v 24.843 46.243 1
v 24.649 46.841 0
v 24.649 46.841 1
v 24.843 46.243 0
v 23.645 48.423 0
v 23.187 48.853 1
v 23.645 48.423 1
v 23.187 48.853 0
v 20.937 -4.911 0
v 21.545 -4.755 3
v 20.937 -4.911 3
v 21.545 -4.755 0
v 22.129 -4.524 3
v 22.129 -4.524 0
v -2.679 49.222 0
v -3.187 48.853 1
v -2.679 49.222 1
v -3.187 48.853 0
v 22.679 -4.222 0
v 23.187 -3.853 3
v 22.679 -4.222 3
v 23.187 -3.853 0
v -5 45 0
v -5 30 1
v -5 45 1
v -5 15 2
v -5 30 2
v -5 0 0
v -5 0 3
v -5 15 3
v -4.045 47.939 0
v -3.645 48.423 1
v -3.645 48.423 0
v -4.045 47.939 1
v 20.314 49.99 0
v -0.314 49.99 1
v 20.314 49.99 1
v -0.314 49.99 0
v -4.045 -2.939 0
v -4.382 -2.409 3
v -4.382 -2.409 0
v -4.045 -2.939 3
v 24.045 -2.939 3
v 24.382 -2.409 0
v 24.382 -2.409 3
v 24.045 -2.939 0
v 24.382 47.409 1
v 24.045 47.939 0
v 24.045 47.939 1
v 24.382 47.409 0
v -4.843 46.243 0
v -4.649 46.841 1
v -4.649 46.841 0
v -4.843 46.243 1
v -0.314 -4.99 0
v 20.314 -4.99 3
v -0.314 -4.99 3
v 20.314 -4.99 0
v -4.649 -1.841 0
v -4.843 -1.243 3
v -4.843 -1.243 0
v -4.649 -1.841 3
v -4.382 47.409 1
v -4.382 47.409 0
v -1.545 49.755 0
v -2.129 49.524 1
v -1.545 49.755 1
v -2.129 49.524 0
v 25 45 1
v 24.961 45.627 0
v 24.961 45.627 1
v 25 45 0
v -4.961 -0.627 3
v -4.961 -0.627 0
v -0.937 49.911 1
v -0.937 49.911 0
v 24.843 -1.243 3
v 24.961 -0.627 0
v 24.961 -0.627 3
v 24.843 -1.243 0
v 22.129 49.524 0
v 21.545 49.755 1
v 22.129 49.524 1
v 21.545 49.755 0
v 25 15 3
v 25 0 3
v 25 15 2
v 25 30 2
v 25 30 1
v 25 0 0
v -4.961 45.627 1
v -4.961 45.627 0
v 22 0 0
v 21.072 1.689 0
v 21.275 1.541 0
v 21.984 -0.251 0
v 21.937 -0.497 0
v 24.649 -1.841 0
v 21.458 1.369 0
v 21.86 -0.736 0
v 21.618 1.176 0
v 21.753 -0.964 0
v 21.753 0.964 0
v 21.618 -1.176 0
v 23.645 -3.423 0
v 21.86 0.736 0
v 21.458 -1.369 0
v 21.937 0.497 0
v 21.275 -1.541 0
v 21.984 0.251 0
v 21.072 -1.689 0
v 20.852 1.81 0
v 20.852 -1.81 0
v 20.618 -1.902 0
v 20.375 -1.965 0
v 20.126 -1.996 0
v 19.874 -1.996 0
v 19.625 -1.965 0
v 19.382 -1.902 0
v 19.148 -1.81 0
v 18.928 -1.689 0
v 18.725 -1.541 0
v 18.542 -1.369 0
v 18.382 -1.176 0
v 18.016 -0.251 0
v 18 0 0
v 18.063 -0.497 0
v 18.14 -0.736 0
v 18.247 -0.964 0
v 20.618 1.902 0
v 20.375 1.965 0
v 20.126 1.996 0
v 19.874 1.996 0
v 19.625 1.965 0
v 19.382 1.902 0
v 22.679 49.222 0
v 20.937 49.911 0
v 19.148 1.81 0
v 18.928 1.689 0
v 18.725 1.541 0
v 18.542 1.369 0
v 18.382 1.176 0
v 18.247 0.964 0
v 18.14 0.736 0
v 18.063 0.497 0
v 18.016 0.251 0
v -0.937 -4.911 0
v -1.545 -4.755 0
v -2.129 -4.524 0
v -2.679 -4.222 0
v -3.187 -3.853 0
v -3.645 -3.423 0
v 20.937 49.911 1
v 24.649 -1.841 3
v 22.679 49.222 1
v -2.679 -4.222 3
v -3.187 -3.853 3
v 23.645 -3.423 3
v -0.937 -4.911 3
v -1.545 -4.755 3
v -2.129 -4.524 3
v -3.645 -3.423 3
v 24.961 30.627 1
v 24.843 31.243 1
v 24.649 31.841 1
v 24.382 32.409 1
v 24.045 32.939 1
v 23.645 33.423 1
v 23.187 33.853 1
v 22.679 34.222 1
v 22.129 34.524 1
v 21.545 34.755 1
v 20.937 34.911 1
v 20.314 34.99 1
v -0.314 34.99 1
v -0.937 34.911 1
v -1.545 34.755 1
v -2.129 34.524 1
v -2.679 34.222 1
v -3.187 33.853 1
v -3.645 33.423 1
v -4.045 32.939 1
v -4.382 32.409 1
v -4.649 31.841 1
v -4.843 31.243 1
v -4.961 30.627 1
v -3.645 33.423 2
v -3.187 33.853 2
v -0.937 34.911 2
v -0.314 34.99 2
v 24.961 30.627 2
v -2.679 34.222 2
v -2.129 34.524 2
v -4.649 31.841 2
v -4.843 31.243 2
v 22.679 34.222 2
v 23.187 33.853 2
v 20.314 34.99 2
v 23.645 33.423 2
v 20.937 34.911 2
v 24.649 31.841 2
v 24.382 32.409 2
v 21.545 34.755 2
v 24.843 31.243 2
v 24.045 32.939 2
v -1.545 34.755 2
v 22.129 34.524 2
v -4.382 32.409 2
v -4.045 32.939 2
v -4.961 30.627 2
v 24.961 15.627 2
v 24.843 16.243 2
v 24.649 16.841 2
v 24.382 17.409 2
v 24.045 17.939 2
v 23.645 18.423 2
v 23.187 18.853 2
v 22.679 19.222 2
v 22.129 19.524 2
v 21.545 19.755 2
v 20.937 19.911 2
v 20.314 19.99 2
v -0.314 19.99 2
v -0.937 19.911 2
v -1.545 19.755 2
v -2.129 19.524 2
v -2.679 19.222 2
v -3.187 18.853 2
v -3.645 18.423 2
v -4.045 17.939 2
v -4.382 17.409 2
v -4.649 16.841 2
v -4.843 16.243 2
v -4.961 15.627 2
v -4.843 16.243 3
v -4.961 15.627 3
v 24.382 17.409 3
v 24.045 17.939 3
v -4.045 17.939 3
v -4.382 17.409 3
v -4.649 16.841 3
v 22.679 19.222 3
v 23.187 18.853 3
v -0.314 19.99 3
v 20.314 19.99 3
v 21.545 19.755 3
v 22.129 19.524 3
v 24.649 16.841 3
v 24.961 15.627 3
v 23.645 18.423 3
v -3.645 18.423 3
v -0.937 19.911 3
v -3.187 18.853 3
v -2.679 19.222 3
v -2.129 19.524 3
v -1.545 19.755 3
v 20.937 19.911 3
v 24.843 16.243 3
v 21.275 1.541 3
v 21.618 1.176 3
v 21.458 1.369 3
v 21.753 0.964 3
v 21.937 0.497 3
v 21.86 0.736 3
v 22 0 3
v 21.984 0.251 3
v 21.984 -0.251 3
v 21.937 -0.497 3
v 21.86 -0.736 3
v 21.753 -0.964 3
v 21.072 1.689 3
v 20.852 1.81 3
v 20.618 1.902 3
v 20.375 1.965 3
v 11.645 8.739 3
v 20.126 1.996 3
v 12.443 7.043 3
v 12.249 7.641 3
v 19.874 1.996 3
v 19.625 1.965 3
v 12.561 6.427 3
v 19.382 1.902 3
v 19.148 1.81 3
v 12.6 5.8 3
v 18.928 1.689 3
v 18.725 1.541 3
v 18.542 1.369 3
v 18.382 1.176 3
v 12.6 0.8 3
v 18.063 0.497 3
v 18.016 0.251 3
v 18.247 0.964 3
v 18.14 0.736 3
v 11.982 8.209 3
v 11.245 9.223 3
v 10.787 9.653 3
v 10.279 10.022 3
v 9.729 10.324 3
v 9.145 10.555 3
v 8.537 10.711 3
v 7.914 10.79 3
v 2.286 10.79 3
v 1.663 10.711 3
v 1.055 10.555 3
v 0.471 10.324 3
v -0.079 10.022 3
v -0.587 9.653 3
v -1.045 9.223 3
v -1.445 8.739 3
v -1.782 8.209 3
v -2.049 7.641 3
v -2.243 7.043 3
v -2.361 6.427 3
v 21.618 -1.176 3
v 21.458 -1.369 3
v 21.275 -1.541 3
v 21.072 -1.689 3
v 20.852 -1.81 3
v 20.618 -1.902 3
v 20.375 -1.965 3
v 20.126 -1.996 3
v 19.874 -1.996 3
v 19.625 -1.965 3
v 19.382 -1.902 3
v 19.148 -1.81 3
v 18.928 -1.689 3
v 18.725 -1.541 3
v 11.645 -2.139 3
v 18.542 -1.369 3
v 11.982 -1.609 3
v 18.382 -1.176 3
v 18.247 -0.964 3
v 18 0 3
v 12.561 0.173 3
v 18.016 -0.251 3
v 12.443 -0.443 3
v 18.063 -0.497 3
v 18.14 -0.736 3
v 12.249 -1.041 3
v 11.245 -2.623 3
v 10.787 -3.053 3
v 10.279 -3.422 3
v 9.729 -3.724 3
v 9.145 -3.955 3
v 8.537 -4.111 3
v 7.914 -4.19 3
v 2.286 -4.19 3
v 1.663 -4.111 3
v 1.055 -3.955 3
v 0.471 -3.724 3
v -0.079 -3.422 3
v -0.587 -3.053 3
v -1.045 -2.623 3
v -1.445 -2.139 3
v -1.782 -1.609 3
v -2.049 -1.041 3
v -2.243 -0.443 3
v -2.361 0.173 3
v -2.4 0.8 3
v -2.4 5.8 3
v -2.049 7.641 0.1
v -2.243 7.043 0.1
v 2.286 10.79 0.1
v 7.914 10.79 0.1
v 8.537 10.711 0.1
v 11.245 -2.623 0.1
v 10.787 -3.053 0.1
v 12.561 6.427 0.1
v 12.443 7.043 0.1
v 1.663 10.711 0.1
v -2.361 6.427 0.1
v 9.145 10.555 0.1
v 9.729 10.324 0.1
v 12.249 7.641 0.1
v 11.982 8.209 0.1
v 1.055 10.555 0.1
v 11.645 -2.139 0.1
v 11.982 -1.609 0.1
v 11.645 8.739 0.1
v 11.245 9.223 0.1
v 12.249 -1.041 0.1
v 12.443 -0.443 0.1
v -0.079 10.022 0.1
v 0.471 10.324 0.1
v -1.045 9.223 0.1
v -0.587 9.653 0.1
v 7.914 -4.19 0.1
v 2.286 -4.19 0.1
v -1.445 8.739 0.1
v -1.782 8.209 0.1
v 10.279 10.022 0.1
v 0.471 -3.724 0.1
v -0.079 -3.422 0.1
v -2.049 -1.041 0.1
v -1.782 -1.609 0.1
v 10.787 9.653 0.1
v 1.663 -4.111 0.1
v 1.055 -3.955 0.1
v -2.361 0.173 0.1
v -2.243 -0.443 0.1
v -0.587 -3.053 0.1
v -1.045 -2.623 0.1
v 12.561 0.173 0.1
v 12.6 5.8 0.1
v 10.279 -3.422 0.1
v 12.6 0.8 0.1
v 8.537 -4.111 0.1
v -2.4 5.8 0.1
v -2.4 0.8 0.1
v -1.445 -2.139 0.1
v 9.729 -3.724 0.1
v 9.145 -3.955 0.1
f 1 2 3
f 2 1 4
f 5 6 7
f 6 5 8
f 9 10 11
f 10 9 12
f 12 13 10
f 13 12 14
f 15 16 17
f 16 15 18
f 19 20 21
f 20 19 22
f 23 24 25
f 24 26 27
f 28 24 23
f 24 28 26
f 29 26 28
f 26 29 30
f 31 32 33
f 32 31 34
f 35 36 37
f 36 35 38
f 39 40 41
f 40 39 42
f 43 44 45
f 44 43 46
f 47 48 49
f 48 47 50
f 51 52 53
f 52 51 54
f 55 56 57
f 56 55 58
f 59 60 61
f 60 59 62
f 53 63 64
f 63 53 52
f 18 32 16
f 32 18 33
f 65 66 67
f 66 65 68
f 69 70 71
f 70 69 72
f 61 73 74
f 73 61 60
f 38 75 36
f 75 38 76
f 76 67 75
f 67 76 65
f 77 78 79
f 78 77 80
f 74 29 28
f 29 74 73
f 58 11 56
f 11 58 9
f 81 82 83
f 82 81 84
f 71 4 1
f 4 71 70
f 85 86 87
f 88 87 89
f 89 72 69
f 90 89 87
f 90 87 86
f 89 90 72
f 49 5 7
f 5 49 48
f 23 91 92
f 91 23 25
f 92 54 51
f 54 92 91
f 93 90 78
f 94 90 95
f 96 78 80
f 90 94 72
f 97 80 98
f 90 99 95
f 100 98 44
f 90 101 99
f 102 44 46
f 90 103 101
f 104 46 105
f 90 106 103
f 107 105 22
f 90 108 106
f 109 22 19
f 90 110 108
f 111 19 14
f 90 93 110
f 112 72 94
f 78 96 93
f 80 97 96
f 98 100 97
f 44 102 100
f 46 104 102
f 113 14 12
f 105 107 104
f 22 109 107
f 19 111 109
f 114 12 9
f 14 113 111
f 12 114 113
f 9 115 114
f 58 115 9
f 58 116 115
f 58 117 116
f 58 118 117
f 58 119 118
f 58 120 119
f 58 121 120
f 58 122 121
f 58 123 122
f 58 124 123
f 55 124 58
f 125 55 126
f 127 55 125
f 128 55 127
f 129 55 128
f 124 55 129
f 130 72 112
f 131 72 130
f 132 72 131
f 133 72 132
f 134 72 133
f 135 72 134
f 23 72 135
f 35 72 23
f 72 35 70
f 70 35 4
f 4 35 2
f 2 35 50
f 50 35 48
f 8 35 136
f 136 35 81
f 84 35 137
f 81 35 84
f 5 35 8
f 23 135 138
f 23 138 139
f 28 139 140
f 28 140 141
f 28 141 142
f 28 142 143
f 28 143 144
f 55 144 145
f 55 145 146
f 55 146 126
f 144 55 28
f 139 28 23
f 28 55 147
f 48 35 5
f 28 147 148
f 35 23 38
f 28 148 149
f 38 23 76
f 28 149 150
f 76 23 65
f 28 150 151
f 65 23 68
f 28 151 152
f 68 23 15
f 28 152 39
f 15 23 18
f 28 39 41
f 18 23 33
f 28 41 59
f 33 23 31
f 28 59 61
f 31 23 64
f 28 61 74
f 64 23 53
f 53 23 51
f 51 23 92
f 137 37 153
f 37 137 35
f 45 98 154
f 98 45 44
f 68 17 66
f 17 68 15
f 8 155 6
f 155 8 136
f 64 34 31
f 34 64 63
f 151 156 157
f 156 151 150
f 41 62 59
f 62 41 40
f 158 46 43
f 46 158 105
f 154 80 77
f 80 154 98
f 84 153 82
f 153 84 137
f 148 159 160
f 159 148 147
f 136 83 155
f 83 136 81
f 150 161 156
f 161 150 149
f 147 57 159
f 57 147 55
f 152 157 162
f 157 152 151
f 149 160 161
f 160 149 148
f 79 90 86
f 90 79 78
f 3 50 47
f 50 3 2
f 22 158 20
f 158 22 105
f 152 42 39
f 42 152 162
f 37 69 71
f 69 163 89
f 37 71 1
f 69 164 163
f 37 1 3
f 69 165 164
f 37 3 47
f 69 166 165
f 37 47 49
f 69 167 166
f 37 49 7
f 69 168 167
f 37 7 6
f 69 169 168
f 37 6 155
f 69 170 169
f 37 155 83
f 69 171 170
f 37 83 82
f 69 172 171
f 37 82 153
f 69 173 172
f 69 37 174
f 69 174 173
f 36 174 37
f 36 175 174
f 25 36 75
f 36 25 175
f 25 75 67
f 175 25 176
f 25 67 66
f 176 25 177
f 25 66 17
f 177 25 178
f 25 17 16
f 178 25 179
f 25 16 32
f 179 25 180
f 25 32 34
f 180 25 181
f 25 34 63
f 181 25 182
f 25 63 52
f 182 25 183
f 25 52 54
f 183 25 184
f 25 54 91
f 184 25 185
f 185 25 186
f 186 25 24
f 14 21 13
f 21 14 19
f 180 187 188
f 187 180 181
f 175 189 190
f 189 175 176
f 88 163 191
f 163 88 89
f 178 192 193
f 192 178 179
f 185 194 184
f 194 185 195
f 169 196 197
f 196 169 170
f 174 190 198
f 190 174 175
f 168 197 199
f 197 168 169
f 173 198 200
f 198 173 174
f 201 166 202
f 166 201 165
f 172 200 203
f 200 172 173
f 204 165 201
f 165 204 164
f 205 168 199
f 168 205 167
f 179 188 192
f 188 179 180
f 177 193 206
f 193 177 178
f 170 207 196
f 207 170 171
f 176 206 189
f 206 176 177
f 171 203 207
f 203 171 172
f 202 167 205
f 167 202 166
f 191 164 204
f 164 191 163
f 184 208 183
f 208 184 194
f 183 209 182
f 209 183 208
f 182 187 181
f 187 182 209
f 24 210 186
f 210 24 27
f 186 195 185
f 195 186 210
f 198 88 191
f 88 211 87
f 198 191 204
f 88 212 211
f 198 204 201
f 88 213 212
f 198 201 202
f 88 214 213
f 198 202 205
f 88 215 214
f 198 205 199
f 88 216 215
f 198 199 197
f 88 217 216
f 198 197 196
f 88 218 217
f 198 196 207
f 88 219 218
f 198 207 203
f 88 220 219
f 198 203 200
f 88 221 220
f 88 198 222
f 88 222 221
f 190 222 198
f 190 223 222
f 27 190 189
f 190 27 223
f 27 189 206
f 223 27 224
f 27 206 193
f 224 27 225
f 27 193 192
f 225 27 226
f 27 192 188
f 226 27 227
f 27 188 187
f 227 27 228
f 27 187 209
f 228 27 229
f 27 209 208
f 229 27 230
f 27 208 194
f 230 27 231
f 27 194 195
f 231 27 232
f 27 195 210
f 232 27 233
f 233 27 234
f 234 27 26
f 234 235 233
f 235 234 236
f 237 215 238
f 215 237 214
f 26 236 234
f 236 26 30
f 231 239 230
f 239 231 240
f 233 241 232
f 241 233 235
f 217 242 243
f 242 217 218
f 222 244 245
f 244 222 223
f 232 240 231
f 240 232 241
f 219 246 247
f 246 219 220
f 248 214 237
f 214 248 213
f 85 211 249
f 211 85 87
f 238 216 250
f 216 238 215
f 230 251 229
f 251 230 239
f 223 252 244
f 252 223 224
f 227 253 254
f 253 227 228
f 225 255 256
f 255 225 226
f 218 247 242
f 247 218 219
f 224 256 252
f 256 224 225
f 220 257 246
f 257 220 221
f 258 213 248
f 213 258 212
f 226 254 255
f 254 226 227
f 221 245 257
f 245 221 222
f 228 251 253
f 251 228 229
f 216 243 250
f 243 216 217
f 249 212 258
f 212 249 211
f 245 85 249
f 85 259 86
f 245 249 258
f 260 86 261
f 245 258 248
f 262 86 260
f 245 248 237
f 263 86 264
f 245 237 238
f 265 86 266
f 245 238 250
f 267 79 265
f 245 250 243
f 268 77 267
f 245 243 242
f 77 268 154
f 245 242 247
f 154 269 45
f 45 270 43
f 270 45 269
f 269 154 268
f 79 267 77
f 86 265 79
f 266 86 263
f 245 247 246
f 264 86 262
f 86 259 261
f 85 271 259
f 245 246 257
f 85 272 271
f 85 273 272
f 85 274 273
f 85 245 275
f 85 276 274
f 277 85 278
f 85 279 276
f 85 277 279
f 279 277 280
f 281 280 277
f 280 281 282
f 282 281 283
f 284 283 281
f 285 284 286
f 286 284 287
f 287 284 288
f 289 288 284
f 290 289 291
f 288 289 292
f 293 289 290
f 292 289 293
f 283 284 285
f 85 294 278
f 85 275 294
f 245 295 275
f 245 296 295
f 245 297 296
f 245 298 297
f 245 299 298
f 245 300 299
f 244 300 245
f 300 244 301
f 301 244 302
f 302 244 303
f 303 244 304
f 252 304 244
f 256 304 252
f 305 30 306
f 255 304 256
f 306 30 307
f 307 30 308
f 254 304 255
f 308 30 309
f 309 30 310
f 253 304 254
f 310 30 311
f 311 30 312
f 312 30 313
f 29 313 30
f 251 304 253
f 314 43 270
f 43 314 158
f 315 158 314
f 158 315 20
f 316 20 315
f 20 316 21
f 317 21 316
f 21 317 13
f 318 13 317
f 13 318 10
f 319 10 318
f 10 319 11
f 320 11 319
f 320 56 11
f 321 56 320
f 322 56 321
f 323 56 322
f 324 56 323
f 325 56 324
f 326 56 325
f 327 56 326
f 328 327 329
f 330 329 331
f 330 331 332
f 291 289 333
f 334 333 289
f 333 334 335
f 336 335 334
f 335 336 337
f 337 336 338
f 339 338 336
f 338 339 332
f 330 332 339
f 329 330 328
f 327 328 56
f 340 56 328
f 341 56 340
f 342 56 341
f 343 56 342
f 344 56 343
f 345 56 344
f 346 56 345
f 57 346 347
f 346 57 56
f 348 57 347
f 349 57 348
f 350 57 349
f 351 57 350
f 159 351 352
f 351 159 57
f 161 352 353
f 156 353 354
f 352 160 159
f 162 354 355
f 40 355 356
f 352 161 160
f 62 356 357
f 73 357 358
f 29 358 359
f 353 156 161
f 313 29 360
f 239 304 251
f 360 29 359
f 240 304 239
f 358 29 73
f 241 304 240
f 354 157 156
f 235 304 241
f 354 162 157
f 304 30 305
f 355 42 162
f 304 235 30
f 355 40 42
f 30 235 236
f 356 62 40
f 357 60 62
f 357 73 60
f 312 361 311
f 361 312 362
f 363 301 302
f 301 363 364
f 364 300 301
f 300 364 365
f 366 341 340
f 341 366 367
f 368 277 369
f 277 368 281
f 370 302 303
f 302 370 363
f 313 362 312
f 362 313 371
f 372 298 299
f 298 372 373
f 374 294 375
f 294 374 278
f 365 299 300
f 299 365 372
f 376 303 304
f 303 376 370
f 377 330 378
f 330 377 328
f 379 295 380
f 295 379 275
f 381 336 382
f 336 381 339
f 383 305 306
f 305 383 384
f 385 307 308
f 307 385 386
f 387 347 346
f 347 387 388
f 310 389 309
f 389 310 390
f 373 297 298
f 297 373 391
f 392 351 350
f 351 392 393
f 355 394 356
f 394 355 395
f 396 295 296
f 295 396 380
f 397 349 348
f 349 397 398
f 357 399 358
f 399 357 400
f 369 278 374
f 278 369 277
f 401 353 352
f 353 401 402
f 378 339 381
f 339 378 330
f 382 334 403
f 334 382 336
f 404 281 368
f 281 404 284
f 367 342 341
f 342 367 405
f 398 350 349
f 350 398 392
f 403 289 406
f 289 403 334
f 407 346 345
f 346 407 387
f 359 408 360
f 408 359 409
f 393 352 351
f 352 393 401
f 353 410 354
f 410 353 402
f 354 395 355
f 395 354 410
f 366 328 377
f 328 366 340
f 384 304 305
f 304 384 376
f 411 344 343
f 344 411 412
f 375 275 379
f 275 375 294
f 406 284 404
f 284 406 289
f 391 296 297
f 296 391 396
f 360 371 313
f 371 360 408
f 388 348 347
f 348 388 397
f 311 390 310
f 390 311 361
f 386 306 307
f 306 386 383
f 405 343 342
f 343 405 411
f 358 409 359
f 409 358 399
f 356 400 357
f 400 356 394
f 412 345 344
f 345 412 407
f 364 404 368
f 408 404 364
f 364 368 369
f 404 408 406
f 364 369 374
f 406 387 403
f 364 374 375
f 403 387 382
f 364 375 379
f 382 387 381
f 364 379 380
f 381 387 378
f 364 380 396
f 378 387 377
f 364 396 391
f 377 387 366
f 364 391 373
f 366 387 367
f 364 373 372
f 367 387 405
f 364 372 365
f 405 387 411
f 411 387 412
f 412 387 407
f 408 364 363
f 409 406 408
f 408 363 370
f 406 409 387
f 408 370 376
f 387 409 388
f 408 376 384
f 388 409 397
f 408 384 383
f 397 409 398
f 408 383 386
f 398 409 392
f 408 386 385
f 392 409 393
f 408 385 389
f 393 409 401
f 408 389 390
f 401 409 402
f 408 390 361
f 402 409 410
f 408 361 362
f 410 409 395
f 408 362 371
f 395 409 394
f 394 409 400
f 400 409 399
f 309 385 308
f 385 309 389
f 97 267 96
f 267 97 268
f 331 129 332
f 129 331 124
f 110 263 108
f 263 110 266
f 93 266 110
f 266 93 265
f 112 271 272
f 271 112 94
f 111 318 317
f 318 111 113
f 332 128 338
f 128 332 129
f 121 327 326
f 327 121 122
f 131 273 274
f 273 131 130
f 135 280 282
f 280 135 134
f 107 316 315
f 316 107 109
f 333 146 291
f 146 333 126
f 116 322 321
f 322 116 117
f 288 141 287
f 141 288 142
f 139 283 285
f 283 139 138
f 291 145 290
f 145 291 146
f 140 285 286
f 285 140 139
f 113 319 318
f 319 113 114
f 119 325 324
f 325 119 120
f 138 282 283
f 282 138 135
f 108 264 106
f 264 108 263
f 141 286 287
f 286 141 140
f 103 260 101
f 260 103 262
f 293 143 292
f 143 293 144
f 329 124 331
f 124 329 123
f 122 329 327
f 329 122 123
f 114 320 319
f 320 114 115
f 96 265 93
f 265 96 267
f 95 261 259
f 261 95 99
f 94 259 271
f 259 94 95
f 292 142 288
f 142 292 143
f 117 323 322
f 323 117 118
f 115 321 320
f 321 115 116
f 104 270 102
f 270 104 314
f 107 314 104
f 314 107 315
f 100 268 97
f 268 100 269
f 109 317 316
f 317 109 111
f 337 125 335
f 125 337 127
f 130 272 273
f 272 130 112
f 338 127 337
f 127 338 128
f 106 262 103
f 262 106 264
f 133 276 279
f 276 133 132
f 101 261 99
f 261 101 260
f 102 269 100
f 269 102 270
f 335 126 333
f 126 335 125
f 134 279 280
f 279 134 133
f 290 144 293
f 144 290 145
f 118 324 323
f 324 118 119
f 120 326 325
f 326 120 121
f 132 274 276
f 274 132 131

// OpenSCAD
lowheight=1;
midheight=2;
highheight=3;
windowheight=.1;
narrowwall=.8;
thickwall=2.6;



$fn=50;
difference(){
    union(){

        minkowski(){
            cube([20,45,lowheight-.5]);
            cylinder(r=5,h=.5);
        }
        minkowski(){
            cube([20,30,midheight-.5]);
            cylinder(r=5,h=.5);
        }
        minkowski(){
            cube([20,15,highheight-.5]);
            cylinder(r=5,h=.5);
        }
    }
    union(){
        minkowski(){
            translate([thickwall,narrowwall,windowheight])cube([5,5,highheight+1]);
            cylinder(r=5,h=.5);
        }
        translate([20,0,0])cylinder(d=4,h=10,center=true);
    }
}
